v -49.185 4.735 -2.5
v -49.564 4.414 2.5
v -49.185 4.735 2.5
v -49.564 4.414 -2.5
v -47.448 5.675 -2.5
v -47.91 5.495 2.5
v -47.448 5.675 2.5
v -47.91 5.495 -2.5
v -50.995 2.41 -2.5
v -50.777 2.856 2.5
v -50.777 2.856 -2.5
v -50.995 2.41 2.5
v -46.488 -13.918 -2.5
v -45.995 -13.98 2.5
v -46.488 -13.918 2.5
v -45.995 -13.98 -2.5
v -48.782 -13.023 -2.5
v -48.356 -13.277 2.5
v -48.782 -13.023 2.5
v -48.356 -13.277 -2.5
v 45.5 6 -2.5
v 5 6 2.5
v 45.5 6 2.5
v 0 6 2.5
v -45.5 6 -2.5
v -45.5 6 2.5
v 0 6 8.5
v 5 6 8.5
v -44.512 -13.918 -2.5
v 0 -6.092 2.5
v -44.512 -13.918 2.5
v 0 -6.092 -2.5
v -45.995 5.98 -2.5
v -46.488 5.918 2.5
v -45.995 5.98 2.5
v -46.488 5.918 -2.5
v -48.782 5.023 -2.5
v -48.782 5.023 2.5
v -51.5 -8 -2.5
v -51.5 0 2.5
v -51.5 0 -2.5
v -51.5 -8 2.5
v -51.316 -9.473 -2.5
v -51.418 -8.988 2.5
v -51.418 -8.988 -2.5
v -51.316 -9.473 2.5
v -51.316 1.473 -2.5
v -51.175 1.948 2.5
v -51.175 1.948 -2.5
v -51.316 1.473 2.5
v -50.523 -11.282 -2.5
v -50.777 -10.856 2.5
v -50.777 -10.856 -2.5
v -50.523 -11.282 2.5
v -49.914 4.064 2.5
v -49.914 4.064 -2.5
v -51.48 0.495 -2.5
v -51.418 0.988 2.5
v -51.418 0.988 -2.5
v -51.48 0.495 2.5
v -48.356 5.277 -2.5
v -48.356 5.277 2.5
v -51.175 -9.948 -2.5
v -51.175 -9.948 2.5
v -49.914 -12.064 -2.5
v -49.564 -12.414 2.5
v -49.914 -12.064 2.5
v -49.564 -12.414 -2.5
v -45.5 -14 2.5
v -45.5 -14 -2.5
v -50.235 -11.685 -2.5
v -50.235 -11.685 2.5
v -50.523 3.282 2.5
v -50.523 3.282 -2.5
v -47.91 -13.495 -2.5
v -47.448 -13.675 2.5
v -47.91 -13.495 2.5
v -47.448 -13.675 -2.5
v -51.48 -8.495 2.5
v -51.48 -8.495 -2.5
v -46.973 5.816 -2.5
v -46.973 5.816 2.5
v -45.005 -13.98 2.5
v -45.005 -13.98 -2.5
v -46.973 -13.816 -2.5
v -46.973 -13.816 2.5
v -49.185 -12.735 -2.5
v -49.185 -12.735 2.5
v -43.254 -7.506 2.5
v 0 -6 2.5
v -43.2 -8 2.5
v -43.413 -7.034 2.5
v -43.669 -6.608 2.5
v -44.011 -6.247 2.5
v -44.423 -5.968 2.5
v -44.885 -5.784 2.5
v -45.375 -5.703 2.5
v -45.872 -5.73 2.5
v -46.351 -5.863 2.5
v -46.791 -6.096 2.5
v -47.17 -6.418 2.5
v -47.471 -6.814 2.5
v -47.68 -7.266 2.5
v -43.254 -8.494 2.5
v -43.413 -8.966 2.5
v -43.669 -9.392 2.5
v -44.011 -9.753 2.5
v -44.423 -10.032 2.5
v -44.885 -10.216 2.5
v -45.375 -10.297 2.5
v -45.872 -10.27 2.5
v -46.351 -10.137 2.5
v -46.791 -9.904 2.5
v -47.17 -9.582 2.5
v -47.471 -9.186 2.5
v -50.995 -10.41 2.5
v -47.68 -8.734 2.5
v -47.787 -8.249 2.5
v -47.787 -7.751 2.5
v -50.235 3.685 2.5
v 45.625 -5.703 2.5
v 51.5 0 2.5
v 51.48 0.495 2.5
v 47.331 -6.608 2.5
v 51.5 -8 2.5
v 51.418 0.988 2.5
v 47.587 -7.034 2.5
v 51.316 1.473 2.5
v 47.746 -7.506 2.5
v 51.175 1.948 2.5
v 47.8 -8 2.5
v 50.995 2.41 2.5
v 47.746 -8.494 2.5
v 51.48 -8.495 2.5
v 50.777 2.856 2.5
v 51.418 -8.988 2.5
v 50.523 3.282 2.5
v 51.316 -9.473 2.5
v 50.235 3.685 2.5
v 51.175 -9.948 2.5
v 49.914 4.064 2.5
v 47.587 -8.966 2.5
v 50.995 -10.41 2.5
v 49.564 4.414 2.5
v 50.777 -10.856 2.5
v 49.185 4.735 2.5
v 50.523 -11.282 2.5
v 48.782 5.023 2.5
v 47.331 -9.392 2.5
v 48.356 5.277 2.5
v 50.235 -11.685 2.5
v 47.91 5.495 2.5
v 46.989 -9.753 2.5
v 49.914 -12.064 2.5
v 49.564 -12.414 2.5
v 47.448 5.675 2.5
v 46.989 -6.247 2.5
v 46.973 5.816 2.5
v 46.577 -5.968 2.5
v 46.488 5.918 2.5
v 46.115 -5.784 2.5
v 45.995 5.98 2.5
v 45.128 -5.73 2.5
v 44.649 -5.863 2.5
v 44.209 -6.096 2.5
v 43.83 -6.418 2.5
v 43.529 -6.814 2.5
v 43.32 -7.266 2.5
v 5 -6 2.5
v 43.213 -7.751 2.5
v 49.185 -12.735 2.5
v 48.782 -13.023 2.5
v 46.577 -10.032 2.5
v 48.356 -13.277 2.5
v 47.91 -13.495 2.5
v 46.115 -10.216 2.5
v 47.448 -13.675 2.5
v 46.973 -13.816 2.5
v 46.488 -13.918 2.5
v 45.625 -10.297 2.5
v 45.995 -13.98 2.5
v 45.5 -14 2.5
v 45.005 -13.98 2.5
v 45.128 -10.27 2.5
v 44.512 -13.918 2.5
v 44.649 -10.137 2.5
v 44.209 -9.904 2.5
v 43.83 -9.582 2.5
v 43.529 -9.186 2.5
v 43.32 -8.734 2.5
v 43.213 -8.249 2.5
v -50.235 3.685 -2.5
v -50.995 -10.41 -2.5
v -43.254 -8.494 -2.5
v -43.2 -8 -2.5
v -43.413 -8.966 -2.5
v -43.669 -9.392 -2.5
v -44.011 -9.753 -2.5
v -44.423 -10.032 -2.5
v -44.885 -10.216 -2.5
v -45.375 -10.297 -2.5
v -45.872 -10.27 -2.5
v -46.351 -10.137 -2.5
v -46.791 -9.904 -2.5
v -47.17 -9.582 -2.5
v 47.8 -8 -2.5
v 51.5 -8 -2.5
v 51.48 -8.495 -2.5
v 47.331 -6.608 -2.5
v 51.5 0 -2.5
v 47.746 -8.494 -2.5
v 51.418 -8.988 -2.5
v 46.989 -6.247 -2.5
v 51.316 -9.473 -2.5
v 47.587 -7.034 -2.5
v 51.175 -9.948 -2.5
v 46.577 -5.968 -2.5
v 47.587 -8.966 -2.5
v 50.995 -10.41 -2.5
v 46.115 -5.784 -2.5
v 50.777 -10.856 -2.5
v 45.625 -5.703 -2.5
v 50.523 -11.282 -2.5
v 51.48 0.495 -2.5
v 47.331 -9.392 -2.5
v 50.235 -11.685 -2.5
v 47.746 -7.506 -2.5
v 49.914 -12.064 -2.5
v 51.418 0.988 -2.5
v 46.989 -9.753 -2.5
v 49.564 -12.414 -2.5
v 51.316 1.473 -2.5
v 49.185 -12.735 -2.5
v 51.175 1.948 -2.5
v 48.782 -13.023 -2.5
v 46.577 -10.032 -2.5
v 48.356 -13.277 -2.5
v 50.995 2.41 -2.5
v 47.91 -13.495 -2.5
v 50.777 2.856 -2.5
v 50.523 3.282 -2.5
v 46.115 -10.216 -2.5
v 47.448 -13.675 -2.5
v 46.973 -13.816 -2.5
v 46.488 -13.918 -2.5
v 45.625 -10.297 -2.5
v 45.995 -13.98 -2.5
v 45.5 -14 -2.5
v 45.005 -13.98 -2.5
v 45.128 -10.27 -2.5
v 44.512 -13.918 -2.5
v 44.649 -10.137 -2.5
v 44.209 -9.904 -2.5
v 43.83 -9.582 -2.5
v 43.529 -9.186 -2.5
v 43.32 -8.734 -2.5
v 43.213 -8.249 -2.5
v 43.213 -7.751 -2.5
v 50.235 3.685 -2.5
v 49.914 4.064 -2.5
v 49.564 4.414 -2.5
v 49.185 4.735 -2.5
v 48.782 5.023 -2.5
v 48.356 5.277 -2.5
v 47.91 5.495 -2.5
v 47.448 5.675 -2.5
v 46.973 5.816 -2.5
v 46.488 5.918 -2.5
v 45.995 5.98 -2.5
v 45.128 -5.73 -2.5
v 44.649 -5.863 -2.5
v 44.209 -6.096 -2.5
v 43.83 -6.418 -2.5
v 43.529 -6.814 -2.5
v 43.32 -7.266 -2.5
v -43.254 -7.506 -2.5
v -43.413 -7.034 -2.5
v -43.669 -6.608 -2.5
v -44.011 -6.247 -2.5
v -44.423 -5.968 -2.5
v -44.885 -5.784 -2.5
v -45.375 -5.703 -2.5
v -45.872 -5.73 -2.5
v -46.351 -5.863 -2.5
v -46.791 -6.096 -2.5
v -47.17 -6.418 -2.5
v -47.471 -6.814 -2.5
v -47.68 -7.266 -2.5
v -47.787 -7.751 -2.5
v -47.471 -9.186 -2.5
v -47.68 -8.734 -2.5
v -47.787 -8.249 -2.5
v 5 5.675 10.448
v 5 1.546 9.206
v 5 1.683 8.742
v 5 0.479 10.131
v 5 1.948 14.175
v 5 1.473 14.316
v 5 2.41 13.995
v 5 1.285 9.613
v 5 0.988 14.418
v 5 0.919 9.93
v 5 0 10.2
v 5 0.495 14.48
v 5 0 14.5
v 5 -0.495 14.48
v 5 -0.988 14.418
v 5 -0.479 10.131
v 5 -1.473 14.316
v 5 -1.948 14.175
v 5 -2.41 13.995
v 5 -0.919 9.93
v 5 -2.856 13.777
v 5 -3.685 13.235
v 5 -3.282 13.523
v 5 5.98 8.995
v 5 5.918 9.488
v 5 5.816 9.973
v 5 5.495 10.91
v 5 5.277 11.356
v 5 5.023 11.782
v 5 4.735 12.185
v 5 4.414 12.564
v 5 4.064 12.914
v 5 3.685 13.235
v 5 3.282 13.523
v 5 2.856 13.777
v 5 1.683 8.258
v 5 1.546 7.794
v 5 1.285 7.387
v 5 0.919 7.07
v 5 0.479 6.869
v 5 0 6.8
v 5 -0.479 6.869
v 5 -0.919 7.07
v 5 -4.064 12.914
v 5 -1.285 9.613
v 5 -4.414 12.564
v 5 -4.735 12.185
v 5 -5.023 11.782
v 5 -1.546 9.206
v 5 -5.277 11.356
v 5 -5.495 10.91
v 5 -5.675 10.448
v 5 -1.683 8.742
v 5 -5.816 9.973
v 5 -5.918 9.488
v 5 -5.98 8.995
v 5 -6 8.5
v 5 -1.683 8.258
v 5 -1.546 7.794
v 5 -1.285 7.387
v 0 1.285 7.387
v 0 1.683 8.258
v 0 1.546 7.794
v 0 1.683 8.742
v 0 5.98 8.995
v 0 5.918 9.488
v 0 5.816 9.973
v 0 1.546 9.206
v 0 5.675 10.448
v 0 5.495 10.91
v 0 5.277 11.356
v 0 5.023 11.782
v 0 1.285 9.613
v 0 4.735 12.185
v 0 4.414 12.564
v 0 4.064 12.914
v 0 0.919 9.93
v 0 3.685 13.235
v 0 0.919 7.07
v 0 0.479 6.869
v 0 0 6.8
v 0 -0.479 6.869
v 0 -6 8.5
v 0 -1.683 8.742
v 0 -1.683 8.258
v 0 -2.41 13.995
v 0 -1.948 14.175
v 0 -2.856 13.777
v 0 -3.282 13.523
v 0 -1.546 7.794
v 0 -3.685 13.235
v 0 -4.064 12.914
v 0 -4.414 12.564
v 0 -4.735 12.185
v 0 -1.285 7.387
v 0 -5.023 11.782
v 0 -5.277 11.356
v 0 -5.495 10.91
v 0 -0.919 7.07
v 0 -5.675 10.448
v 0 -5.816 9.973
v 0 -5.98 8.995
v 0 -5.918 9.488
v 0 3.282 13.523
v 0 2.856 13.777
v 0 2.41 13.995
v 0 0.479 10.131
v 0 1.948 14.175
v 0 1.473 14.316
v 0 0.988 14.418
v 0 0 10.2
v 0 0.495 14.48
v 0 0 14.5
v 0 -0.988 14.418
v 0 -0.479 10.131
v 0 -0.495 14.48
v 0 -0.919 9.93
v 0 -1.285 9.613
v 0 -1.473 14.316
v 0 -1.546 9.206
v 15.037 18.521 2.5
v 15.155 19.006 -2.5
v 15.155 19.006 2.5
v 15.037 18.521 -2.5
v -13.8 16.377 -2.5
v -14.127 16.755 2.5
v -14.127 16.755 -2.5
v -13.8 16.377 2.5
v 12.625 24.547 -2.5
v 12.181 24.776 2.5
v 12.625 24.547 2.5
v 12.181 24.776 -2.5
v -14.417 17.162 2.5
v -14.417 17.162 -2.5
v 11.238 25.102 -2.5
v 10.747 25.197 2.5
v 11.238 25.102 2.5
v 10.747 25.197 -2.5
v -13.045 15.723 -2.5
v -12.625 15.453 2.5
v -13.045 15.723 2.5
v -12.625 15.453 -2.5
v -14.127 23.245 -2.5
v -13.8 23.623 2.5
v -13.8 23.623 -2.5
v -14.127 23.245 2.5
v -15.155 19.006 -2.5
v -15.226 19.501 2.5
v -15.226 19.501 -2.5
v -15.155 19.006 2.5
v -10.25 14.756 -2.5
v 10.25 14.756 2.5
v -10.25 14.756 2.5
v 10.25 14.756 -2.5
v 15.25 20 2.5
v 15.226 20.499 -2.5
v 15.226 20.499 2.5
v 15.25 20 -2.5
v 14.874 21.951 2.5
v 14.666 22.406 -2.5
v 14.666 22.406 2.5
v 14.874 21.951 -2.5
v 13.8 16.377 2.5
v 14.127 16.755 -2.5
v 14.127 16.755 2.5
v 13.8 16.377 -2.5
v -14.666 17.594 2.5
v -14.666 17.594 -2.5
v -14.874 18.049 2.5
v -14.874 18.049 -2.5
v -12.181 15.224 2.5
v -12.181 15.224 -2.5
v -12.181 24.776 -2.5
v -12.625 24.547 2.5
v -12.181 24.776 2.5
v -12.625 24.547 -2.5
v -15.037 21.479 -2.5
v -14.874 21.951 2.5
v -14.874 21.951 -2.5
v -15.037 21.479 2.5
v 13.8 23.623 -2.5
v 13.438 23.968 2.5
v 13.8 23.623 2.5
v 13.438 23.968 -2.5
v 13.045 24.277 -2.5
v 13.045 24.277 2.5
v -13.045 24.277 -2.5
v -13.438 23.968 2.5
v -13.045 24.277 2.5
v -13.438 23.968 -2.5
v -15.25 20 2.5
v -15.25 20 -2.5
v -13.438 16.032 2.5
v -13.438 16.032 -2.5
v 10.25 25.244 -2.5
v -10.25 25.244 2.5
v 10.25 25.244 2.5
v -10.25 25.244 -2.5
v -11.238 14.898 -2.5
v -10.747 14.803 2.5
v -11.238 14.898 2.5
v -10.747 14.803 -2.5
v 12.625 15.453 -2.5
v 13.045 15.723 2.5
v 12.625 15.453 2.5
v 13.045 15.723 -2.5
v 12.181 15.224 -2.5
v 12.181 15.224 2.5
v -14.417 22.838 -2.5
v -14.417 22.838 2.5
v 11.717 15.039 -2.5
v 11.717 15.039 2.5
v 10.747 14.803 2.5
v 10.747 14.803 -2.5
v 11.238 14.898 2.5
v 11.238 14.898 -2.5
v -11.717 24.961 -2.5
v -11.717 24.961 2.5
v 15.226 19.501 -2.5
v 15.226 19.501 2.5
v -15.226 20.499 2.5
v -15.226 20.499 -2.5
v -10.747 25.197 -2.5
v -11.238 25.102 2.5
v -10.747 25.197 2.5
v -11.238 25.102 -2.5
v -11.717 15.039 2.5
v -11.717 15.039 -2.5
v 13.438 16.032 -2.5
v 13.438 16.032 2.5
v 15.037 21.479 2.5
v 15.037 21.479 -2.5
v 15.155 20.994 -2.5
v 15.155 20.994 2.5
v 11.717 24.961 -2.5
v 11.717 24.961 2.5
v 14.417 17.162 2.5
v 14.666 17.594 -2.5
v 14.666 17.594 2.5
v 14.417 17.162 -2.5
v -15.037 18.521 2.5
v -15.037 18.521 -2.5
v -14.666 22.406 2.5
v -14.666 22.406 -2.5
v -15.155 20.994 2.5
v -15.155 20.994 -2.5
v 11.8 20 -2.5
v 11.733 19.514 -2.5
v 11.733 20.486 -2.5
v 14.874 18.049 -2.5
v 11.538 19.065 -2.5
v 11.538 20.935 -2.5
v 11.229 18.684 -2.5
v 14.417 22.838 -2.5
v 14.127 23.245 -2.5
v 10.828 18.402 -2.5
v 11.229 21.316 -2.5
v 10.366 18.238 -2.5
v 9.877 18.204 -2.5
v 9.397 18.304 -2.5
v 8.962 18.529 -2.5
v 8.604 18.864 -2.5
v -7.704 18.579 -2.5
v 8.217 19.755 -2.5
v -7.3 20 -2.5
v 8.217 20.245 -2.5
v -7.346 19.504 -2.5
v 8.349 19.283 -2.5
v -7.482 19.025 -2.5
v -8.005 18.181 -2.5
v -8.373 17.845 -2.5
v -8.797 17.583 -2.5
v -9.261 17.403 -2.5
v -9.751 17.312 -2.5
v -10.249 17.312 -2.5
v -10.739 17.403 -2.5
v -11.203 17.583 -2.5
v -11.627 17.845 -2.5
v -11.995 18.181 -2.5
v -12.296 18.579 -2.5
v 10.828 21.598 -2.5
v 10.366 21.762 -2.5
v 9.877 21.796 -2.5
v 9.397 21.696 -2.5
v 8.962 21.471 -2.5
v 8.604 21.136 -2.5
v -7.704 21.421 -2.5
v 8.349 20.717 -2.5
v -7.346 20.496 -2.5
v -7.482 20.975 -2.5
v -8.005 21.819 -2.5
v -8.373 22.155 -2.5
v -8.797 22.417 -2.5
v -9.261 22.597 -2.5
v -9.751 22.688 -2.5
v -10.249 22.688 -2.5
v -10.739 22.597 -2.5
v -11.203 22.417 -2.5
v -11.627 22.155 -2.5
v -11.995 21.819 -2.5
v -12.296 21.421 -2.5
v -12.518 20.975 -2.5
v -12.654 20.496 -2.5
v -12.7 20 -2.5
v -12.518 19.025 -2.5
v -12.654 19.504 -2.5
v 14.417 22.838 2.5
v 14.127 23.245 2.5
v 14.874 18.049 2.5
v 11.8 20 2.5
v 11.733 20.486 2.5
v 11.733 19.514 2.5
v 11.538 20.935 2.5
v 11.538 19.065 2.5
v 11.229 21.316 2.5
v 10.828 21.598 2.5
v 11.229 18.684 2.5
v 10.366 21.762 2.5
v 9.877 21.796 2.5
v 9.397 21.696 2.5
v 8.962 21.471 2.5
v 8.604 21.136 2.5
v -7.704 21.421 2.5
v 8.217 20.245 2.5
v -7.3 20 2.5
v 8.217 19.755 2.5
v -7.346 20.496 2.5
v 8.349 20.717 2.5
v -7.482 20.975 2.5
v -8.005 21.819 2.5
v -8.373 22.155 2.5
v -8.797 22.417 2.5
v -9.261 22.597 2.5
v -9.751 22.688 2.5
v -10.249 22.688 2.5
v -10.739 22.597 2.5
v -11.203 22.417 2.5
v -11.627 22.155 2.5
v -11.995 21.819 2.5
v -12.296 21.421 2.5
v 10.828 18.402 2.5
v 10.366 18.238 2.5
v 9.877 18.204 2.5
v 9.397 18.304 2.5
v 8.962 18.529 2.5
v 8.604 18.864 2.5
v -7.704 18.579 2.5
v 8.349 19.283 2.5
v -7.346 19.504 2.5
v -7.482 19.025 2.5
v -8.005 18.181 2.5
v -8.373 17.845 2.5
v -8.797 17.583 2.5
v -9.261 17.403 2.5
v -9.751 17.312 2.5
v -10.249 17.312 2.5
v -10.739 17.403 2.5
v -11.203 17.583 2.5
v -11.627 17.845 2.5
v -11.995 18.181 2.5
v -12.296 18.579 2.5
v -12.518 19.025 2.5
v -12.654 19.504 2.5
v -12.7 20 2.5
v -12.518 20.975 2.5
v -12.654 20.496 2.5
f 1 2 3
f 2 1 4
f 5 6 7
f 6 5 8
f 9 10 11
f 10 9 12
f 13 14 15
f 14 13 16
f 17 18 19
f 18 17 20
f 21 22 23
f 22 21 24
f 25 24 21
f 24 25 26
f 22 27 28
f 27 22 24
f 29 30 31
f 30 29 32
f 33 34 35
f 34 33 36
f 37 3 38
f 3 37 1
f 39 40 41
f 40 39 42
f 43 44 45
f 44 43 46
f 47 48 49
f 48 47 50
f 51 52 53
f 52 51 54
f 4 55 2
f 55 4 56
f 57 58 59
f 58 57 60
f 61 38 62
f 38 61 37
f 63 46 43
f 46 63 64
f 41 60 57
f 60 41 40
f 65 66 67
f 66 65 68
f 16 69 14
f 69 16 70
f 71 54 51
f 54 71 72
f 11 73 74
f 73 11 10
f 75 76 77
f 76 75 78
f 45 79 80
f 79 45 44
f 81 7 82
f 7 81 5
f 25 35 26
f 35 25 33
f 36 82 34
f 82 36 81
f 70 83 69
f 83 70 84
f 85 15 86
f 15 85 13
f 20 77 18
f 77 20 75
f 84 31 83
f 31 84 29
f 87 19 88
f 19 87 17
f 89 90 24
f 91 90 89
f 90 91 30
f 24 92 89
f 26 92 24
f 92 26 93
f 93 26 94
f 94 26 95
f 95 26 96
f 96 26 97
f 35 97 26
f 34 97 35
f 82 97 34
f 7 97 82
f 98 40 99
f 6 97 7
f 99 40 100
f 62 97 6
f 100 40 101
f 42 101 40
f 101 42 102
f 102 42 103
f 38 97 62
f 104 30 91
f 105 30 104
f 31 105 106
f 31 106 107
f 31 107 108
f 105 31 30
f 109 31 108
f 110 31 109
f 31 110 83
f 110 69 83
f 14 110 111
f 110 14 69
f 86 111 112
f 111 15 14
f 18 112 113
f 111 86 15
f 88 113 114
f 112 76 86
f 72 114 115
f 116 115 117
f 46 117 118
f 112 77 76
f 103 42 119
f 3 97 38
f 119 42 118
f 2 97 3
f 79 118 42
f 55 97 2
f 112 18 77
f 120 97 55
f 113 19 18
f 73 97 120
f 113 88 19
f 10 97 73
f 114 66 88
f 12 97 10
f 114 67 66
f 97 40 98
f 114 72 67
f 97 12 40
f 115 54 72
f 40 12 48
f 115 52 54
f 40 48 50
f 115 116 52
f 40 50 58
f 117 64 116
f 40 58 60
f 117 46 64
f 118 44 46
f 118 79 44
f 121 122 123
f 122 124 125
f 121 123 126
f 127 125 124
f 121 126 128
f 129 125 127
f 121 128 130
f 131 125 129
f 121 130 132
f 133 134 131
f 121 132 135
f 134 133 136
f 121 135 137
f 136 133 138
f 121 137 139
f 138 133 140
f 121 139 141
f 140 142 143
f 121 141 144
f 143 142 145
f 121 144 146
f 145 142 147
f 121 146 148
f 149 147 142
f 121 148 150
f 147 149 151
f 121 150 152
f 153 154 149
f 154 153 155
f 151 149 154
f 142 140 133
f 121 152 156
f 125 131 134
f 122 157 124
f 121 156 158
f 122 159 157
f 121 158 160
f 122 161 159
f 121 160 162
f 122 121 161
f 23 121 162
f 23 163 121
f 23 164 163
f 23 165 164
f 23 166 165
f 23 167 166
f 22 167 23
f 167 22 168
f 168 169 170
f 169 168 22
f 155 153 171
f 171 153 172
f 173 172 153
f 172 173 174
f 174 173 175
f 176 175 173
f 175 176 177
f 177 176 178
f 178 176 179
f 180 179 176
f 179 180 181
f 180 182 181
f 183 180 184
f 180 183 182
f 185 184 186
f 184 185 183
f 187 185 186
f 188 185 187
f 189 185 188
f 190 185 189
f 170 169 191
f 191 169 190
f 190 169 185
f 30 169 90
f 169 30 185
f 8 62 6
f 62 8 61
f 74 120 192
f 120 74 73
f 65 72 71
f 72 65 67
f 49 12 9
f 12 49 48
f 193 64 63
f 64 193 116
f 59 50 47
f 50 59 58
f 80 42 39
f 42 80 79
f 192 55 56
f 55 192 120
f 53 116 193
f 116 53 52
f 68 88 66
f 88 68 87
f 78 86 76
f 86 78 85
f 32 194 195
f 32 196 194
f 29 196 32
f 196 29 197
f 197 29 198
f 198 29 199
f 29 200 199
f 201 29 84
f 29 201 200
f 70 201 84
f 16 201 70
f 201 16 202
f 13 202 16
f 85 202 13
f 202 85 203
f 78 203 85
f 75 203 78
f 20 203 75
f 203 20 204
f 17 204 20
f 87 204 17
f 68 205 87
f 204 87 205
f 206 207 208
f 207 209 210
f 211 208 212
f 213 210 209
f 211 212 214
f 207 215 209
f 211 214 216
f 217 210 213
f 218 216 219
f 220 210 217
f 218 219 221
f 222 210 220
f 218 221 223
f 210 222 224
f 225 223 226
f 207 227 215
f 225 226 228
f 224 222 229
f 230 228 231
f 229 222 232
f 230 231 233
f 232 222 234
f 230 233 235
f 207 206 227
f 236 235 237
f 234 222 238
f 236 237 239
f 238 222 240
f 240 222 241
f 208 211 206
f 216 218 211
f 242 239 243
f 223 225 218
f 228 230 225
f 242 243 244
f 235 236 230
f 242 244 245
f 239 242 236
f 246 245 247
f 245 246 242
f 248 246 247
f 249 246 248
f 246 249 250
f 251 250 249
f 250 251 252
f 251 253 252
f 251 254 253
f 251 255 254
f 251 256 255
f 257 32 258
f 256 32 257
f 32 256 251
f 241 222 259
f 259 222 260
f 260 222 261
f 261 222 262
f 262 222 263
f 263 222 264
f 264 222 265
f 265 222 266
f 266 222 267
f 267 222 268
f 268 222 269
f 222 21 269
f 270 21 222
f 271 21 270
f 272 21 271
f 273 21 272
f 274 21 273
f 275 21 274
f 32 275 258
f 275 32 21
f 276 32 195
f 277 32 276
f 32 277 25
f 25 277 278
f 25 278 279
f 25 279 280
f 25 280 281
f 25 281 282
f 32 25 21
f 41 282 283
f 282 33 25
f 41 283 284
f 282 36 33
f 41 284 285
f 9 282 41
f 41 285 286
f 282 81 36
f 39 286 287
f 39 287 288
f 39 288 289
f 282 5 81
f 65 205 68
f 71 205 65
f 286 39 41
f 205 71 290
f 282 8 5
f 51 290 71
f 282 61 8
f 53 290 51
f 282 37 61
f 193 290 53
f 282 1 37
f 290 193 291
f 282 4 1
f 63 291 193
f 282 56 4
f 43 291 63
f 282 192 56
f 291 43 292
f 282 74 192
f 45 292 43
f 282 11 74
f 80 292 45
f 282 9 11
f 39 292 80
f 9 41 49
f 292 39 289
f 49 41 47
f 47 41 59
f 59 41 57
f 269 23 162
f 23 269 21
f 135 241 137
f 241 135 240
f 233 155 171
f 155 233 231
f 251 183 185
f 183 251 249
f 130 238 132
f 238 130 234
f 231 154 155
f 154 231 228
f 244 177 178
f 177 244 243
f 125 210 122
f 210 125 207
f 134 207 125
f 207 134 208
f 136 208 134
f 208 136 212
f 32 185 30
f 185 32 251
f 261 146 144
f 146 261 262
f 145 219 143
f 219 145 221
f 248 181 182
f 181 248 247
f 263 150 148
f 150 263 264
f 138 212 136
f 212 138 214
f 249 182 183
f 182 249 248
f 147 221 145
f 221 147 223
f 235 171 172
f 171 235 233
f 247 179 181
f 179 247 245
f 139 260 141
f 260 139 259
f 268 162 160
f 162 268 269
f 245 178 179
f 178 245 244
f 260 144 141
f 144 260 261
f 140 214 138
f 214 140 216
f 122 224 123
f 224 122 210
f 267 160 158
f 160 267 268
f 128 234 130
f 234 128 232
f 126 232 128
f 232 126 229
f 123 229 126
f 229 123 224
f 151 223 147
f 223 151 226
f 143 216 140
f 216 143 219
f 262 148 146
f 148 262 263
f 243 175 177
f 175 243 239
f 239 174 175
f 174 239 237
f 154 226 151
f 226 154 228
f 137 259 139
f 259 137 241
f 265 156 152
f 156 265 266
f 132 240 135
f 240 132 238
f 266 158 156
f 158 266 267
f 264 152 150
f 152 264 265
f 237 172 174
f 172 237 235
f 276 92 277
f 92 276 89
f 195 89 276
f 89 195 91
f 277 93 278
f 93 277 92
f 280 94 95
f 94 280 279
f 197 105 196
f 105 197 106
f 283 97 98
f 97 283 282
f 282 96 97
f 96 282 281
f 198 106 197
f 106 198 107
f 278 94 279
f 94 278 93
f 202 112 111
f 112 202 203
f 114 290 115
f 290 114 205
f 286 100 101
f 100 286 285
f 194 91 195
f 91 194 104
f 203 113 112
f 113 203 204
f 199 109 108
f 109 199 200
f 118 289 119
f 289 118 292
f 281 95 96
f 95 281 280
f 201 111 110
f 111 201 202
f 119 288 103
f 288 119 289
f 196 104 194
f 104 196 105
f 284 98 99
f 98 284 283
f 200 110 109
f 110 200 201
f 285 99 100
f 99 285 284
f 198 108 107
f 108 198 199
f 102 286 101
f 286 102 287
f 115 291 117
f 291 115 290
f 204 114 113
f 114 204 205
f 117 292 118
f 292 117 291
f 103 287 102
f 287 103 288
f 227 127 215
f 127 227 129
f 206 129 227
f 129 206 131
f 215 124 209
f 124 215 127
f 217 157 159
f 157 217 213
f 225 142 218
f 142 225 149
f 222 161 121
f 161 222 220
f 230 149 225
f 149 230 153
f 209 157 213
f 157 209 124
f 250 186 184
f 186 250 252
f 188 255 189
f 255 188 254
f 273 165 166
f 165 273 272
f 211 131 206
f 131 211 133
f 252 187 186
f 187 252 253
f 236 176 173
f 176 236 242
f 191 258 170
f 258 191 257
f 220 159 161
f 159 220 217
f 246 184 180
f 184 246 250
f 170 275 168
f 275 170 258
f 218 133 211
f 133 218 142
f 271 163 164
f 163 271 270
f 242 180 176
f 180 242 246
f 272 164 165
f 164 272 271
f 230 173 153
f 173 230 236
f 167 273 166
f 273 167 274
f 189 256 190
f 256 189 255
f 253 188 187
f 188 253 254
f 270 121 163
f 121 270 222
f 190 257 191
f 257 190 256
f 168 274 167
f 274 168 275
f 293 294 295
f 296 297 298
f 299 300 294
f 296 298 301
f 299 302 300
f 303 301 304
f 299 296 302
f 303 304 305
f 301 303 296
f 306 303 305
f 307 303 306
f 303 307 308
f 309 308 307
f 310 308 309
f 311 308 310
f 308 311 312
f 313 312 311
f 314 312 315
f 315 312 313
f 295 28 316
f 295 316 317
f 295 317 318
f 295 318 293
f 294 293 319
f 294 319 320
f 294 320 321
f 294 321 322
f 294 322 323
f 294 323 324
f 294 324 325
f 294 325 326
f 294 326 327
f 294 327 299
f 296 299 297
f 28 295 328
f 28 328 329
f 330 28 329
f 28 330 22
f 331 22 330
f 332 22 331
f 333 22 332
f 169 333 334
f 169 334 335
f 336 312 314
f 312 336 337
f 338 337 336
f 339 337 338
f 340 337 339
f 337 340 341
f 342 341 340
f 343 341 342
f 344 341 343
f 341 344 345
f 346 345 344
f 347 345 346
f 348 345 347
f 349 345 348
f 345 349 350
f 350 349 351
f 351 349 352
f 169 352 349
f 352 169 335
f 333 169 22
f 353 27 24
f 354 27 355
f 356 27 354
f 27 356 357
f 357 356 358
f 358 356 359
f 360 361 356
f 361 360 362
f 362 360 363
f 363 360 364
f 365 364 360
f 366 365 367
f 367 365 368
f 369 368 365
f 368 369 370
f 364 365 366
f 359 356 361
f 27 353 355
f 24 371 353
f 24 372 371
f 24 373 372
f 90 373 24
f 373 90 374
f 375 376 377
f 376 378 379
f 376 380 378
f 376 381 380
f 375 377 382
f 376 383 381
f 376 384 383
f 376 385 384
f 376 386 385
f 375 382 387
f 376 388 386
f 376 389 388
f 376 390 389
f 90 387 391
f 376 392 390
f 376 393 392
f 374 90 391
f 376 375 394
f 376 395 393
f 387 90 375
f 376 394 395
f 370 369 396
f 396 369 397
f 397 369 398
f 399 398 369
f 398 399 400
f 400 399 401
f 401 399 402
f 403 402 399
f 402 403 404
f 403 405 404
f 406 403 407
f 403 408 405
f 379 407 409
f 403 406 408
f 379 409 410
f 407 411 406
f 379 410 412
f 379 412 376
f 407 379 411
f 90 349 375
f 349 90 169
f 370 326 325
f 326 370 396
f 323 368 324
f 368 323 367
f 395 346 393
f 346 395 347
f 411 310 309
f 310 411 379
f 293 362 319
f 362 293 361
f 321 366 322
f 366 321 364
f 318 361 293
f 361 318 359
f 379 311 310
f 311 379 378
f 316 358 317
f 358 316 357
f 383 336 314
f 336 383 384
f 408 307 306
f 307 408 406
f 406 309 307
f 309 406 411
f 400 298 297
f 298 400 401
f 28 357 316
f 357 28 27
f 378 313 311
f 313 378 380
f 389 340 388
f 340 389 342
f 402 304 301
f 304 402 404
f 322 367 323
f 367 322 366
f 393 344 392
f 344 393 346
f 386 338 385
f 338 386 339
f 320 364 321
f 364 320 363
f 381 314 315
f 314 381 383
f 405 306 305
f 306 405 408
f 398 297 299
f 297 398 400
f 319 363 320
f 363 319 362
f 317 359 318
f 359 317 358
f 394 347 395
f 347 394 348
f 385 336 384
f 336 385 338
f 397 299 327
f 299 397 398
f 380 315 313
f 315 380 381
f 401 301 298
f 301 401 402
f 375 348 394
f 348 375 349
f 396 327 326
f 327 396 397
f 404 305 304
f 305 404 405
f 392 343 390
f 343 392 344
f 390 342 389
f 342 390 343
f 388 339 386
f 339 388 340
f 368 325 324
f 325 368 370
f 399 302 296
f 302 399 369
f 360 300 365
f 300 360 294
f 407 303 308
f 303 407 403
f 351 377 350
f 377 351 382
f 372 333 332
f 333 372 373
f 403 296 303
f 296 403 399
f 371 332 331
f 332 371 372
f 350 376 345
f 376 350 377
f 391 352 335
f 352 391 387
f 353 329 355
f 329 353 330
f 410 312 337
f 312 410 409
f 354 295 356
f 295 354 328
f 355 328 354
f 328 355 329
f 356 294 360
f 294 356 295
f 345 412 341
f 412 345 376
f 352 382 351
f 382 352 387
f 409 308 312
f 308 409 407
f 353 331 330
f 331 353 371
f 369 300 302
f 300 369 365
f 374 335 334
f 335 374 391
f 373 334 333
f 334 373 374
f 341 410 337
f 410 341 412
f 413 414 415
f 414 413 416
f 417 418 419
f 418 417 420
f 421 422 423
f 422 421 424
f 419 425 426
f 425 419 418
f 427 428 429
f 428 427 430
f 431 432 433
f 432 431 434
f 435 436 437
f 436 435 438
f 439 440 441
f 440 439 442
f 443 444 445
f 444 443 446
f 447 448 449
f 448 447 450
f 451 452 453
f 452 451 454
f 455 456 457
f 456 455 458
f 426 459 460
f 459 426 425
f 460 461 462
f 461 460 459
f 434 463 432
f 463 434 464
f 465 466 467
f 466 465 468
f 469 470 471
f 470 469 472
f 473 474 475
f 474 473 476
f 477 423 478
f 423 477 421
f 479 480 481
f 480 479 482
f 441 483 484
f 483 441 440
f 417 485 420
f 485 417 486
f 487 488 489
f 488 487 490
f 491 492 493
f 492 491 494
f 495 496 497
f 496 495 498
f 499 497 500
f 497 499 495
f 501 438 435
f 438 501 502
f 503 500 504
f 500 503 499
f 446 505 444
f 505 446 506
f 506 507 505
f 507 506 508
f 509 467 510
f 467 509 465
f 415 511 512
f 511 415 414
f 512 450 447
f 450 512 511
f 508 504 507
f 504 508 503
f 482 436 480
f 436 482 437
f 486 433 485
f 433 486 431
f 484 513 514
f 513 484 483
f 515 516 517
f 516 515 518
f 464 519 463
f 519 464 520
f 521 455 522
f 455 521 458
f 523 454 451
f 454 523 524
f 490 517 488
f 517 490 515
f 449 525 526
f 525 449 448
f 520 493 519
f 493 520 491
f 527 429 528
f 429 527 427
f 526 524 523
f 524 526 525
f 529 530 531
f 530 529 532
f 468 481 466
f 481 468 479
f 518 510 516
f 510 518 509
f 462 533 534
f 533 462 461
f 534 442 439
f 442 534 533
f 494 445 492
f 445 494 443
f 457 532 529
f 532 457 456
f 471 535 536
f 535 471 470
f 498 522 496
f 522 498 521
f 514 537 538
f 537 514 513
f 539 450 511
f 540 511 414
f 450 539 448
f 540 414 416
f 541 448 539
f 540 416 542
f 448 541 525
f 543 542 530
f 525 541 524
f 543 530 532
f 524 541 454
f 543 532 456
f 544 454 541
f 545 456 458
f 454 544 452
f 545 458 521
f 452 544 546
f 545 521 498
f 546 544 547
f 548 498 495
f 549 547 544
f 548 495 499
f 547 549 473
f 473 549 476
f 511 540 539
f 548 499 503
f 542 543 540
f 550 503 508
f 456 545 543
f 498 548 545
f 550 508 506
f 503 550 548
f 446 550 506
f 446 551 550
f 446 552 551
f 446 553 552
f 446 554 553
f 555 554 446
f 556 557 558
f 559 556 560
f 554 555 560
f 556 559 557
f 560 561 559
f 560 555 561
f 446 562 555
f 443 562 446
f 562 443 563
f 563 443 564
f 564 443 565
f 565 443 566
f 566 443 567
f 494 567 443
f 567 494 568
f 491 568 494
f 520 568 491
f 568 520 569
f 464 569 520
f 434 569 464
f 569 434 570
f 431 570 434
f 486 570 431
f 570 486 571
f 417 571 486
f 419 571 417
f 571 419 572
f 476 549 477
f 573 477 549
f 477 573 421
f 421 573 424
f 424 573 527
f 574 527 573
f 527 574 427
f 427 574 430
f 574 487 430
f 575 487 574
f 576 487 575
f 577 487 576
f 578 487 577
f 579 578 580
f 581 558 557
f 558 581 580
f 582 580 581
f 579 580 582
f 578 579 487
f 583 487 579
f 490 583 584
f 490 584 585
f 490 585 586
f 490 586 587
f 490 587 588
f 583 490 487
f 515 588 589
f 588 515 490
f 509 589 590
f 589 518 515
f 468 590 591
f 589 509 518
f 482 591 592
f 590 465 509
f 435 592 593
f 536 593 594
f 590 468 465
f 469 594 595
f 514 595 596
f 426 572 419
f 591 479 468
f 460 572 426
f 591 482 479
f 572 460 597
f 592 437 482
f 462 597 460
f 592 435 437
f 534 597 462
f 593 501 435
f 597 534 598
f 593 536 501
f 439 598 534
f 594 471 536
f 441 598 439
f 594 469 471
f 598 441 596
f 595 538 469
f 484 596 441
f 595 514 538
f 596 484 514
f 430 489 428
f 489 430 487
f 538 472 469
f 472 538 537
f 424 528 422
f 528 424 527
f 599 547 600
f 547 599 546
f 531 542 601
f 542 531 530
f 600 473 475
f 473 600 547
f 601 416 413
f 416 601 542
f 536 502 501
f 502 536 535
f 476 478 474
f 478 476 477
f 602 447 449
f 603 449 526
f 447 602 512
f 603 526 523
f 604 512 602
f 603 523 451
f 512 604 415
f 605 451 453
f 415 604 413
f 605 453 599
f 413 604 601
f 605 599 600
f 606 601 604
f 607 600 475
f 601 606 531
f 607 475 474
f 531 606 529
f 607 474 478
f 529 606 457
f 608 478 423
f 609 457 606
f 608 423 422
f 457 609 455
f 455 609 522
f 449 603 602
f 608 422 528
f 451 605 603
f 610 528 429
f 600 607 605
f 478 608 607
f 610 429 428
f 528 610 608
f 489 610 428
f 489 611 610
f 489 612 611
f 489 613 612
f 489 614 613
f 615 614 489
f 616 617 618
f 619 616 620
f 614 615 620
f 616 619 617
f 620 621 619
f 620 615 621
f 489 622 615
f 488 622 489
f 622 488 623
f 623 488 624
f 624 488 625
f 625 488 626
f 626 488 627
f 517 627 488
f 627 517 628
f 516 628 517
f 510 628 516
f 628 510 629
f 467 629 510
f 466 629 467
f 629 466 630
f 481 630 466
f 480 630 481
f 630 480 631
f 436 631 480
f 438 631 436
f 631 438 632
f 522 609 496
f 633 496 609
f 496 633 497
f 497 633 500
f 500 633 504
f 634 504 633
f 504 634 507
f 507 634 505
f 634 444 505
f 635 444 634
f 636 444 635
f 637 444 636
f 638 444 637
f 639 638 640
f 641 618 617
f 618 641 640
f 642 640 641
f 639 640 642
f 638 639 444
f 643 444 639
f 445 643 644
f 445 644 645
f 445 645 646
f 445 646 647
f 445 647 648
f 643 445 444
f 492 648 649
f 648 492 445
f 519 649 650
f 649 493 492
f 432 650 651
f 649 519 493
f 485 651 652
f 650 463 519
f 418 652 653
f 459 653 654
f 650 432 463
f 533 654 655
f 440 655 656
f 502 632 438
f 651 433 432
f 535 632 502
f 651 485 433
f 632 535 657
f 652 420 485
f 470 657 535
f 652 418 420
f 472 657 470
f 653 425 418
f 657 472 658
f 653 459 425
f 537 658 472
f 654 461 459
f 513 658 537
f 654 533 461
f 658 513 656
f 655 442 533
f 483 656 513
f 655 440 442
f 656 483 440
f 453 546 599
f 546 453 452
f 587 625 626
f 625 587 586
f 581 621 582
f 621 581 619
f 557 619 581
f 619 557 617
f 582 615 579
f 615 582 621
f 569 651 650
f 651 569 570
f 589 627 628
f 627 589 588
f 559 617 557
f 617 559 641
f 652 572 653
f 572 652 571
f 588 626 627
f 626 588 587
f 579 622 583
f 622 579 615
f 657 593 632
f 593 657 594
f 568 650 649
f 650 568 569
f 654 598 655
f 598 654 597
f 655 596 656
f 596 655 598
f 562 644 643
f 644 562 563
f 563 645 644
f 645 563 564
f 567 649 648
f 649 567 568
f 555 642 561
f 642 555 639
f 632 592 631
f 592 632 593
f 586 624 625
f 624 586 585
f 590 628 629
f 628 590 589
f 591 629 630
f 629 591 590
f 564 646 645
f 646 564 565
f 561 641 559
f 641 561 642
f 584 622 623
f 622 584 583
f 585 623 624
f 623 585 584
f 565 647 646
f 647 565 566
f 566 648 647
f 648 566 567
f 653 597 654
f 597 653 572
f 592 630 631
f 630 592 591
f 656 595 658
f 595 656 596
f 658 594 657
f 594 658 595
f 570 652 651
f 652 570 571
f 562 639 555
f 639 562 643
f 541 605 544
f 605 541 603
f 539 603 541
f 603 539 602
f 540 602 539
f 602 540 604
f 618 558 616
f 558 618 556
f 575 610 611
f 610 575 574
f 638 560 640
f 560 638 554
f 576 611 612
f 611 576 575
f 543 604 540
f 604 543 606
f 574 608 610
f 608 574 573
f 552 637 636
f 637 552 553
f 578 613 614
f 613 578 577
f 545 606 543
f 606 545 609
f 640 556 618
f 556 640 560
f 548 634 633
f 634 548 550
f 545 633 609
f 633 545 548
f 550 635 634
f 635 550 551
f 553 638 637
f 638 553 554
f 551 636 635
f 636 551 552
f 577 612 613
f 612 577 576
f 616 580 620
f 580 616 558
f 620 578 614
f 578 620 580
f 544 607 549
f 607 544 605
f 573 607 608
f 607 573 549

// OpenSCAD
$fs = 0.5;
$fa = 0.5;
//---------------------------------------------------------------------------------------------------- 
// CloverPlus v3 fan mount by pbmax (mpeterson333/@/gmail.com)
//---------------------------------------------------------------------------------------------------- 
// These parts attach a 100mm or 120mm PC case fan to the side of the printer for part cooling 
// purposes.
//---------------------------------------------------------------------------------------------------- 


cloverplus_v3_fan_mount();

module cloverplus_v3_fan_mount()
{
  // This is the link that connects the fanmount to the frame.
  // It secures via an M5 screw on the frame side and a M3 screw on the fan side
  // Default screw size is M5 x 20mm and M3 x 16mm
  link_length = 20;
  link_height = 10.5;
  link_thick = 5;
  
  link_hole1_d = 5.4;
  link_hole2_d = 3.6;
  
  // Change this as needed
  // Hole spacing (for 100mm PC case fan)
  fanmount_length = 91;
  // Hole spacing (for 120mm PC case fan)
  //fanmount_length = 105;
  
  
  fanmount_height = 12;
  fanmount_thick = 5;
  fanmount_hole_d = 4.6;
  fanmount_link_offset = 0;
  fanmount_link_height = 6;
  fanmount_link_width = 12;
  fanmount_link_thick = 5;
  fanmount_link_hole_d = 3.4;
  fanmount_y_offset = -8;
  
  fanmount();
  
  translate([0,20,0])
    link();
  
  
  module fanmount()
  {
    difference()
    {
      union()
      {
        // Fan mount body
        for(i=[-1,1])
          hull()
          {
            cylinder(d=fanmount_height, h=fanmount_thick, center=true);
            translate([i*fanmount_length*0.5, 0, 0])
              cylinder(d=fanmount_height, h=fanmount_thick, center=true);
            translate([i*fanmount_length*0.5, fanmount_y_offset, 0])
              cylinder(d=fanmount_height, h=fanmount_thick, center=true);
          }
      }
      // Minus fan mount holes
      for(i=[-1,1])
        translate([i*fanmount_length*0.5, fanmount_y_offset, 0])
          cylinder(d=fanmount_hole_d, h=fanmount_thick+0.2, center=true);
    }
  
    // Fan mount to link connection
    translate([fanmount_link_offset+fanmount_link_thick*0.5, 
               0, 
               fanmount_link_thick*0.5+fanmount_link_height*0.5])
    {
      difference()
      {
        // Vertical part
        union()
        {
          cube([fanmount_link_thick, fanmount_link_width, fanmount_link_height], center=true);
          translate([0,0,fanmount_link_height*0.5])
          rotate([0,90,0])
            cylinder(h=fanmount_link_thick, d=fanmount_link_width, center=true);
        }
        // Minus hole
        translate([0,0,fanmount_link_height*0.5])
          rotate([0,90,0])
            cylinder(h=fanmount_link_thick+0.2, d=fanmount_link_hole_d, center=true);
      }
    }
  }
  
  
  module link()
  {
    difference()
    {
      // Link body
      hull()
      {
        for(i=[-1,1])
          translate([i*link_length*0.5, 0, 0])
            cylinder(d=link_height, h=link_thick, center=true);
      }
      // Mount holes
      translate([-link_length*0.5, 0, 0])
        cylinder(d=link_hole1_d, h=link_thick+0.2, center=true);
      translate([link_length*0.5, 0, 0])
        cylinder(d=link_hole2_d, h=link_thick+0.2, center=true);
    }
  }
}
